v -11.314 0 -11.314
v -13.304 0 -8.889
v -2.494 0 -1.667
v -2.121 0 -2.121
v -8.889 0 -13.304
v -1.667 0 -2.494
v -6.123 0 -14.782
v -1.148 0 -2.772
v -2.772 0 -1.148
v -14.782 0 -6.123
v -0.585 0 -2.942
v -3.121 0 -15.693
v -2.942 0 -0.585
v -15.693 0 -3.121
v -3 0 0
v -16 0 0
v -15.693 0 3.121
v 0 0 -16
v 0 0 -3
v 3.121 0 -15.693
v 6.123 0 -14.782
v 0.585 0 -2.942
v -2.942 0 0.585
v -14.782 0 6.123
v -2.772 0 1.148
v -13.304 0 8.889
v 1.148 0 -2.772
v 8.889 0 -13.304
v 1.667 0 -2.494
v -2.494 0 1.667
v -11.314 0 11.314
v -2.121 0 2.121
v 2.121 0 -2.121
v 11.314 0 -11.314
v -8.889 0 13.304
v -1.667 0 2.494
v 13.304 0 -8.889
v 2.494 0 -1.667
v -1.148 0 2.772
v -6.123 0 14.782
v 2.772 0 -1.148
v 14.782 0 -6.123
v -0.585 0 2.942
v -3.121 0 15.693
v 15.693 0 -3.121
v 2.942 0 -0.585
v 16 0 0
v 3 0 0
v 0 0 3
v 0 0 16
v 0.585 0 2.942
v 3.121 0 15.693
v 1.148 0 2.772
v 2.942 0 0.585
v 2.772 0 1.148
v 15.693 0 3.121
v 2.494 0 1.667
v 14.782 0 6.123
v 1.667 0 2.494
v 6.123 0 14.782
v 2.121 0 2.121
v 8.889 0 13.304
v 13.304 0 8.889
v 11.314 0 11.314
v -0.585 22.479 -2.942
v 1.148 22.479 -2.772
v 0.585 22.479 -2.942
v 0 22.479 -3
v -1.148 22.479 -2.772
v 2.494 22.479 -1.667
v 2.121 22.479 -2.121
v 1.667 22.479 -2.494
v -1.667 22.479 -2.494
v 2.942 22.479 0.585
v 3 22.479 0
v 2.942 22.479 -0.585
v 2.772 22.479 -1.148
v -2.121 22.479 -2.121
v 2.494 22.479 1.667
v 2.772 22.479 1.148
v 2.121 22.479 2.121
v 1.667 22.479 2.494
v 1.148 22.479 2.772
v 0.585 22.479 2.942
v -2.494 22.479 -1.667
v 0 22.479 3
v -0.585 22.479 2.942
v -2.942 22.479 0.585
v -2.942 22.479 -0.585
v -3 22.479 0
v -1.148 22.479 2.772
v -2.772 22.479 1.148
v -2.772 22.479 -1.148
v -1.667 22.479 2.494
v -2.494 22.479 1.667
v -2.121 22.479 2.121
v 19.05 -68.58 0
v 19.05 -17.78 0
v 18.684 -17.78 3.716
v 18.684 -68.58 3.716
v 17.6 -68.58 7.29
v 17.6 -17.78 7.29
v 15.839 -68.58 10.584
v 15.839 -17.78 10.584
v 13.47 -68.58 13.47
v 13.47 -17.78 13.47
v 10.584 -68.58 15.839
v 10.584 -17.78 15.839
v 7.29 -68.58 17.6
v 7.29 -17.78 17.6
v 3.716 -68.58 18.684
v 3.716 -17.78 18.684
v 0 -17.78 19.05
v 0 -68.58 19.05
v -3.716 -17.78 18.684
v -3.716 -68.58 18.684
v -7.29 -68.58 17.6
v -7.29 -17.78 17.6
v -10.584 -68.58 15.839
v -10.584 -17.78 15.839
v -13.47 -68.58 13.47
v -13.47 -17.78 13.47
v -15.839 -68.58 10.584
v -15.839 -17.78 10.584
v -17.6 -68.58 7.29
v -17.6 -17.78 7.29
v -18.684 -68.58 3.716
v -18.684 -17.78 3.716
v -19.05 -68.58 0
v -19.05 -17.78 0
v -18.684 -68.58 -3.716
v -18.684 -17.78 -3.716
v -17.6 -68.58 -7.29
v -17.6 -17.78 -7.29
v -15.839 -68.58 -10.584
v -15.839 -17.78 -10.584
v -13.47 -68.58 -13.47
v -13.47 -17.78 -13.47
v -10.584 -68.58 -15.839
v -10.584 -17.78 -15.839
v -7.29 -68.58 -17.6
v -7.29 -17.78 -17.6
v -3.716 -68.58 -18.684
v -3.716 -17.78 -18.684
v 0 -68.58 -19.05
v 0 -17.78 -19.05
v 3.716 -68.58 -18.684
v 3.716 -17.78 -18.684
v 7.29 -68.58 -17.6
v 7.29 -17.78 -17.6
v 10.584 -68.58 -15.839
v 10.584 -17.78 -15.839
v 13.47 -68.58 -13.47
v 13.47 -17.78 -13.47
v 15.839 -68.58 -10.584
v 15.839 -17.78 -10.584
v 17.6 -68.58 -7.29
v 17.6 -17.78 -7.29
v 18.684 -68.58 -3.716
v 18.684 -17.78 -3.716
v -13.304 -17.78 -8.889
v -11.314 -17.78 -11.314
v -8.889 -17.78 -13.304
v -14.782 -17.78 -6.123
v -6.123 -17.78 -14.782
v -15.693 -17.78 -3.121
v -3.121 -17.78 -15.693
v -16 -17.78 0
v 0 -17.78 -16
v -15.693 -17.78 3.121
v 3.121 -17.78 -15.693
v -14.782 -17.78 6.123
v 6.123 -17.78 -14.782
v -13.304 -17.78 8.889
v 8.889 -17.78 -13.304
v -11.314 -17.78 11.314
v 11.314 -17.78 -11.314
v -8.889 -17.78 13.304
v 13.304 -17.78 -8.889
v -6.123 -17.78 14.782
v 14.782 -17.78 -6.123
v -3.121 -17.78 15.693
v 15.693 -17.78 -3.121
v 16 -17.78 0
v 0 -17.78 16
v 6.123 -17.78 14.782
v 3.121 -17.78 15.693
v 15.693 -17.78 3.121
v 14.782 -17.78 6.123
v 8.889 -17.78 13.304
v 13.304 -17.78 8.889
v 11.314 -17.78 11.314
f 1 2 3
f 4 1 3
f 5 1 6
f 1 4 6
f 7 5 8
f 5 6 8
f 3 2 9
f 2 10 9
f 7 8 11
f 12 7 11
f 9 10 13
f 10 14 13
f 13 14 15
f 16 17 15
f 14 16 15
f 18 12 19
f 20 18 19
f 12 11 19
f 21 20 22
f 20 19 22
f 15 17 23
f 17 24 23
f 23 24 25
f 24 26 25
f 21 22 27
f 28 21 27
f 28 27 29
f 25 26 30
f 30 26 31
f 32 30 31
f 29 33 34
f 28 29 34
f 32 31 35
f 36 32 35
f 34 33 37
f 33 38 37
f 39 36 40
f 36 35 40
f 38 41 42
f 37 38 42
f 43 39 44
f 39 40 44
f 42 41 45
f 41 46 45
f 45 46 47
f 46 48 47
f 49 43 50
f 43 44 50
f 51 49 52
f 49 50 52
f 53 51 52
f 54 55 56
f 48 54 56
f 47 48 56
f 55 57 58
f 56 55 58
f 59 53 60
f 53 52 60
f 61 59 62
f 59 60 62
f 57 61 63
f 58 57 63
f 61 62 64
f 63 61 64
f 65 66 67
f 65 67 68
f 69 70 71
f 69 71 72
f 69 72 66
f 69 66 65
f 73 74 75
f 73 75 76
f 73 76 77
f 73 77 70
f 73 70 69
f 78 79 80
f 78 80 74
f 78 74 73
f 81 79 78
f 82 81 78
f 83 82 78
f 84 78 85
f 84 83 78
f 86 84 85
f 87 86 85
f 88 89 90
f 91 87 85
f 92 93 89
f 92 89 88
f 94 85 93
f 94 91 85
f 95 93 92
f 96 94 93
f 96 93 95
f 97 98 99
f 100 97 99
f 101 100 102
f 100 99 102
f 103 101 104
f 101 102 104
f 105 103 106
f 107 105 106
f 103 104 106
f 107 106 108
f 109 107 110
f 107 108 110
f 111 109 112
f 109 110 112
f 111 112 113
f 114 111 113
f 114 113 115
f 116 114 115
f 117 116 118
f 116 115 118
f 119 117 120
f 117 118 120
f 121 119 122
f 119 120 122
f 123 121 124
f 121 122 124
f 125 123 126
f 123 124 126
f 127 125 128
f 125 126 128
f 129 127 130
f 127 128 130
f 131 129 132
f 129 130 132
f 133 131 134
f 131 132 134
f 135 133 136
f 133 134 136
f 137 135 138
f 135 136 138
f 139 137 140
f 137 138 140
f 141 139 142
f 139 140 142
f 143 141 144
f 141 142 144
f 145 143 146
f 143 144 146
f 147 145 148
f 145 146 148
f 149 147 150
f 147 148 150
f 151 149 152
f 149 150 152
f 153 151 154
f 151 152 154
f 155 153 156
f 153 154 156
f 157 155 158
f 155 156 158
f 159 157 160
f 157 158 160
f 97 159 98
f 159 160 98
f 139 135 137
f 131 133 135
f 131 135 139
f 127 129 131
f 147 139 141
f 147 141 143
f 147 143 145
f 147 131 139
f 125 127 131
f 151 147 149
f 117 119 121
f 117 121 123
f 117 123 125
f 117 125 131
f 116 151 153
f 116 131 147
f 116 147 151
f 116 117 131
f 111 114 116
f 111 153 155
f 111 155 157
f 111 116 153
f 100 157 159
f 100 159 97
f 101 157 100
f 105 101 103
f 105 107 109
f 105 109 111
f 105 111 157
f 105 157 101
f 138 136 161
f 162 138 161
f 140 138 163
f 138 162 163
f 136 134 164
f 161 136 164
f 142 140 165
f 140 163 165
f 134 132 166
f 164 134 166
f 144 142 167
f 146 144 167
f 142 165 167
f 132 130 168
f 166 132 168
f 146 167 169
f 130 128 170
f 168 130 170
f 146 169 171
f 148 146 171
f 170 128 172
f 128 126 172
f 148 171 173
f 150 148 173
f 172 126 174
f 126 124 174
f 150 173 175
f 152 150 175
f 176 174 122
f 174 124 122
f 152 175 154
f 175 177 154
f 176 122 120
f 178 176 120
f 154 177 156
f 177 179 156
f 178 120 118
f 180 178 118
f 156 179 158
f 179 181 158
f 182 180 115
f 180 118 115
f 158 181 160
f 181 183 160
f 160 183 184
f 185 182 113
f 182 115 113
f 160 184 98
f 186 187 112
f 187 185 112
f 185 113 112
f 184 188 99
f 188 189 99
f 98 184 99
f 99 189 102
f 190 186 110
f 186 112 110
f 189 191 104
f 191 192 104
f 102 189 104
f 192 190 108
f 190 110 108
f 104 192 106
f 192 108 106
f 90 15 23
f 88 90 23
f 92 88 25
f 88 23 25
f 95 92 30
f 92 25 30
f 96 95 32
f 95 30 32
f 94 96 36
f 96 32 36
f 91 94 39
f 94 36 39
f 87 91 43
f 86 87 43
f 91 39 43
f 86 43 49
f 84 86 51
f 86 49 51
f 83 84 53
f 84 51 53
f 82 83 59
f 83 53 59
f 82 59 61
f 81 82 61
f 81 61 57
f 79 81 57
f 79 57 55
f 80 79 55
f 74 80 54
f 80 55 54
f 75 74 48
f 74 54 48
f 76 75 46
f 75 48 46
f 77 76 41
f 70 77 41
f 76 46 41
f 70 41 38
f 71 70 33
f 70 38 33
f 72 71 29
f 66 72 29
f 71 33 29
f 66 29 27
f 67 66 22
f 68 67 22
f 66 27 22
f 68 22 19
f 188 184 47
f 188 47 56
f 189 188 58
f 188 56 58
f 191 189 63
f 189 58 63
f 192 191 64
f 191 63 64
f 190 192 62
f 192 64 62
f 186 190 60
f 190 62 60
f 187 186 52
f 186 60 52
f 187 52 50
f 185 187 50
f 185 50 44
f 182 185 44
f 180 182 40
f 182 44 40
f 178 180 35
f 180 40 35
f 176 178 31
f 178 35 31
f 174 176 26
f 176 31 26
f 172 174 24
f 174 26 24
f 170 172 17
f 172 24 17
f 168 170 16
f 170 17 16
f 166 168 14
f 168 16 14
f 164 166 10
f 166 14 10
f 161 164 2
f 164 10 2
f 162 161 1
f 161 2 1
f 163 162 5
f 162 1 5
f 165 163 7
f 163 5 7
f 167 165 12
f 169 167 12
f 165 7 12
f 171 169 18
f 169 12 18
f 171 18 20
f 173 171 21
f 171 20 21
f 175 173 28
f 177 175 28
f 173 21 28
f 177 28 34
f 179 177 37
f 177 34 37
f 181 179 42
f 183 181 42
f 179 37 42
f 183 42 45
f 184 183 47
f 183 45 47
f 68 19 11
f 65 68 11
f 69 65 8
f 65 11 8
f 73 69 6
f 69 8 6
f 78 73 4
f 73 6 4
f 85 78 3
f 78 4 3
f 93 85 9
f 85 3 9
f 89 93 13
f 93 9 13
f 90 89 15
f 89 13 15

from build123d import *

# Parameters (mm, degrees)
F0_R     = 16
F1_DEPTH = 17.78
F2_R     = 19.05
F3_DEPTH = 50.8
F5_DEPTH = 22.479


with BuildPart() as f1:
    # F0 (on Front) → F1 (new body)
    with BuildSketch(Plane.XZ):
        Circle(F0_R)
    extrude(amount=F1_DEPTH)

    # F2 (on face) → F3 (join)
    with BuildSketch(Plane.XZ.offset(17.78)):
        Circle(F2_R)
    extrude(amount=F3_DEPTH)

    # F4 (on face) → F5 (join)
    with BuildSketch(Plane(origin=(0, 0, 0), x_dir=(-1, 0, 0), z_dir=(0, 1, 0))):
        with BuildLine():
            ThreePointArc((0, -3), (2.12132, -2.12132), (3, 0))
            ThreePointArc((3, 0), (-2.12132, 2.12132), (0, -3))
        make_face()
    extrude(amount=F5_DEPTH)


solid = f1.part
